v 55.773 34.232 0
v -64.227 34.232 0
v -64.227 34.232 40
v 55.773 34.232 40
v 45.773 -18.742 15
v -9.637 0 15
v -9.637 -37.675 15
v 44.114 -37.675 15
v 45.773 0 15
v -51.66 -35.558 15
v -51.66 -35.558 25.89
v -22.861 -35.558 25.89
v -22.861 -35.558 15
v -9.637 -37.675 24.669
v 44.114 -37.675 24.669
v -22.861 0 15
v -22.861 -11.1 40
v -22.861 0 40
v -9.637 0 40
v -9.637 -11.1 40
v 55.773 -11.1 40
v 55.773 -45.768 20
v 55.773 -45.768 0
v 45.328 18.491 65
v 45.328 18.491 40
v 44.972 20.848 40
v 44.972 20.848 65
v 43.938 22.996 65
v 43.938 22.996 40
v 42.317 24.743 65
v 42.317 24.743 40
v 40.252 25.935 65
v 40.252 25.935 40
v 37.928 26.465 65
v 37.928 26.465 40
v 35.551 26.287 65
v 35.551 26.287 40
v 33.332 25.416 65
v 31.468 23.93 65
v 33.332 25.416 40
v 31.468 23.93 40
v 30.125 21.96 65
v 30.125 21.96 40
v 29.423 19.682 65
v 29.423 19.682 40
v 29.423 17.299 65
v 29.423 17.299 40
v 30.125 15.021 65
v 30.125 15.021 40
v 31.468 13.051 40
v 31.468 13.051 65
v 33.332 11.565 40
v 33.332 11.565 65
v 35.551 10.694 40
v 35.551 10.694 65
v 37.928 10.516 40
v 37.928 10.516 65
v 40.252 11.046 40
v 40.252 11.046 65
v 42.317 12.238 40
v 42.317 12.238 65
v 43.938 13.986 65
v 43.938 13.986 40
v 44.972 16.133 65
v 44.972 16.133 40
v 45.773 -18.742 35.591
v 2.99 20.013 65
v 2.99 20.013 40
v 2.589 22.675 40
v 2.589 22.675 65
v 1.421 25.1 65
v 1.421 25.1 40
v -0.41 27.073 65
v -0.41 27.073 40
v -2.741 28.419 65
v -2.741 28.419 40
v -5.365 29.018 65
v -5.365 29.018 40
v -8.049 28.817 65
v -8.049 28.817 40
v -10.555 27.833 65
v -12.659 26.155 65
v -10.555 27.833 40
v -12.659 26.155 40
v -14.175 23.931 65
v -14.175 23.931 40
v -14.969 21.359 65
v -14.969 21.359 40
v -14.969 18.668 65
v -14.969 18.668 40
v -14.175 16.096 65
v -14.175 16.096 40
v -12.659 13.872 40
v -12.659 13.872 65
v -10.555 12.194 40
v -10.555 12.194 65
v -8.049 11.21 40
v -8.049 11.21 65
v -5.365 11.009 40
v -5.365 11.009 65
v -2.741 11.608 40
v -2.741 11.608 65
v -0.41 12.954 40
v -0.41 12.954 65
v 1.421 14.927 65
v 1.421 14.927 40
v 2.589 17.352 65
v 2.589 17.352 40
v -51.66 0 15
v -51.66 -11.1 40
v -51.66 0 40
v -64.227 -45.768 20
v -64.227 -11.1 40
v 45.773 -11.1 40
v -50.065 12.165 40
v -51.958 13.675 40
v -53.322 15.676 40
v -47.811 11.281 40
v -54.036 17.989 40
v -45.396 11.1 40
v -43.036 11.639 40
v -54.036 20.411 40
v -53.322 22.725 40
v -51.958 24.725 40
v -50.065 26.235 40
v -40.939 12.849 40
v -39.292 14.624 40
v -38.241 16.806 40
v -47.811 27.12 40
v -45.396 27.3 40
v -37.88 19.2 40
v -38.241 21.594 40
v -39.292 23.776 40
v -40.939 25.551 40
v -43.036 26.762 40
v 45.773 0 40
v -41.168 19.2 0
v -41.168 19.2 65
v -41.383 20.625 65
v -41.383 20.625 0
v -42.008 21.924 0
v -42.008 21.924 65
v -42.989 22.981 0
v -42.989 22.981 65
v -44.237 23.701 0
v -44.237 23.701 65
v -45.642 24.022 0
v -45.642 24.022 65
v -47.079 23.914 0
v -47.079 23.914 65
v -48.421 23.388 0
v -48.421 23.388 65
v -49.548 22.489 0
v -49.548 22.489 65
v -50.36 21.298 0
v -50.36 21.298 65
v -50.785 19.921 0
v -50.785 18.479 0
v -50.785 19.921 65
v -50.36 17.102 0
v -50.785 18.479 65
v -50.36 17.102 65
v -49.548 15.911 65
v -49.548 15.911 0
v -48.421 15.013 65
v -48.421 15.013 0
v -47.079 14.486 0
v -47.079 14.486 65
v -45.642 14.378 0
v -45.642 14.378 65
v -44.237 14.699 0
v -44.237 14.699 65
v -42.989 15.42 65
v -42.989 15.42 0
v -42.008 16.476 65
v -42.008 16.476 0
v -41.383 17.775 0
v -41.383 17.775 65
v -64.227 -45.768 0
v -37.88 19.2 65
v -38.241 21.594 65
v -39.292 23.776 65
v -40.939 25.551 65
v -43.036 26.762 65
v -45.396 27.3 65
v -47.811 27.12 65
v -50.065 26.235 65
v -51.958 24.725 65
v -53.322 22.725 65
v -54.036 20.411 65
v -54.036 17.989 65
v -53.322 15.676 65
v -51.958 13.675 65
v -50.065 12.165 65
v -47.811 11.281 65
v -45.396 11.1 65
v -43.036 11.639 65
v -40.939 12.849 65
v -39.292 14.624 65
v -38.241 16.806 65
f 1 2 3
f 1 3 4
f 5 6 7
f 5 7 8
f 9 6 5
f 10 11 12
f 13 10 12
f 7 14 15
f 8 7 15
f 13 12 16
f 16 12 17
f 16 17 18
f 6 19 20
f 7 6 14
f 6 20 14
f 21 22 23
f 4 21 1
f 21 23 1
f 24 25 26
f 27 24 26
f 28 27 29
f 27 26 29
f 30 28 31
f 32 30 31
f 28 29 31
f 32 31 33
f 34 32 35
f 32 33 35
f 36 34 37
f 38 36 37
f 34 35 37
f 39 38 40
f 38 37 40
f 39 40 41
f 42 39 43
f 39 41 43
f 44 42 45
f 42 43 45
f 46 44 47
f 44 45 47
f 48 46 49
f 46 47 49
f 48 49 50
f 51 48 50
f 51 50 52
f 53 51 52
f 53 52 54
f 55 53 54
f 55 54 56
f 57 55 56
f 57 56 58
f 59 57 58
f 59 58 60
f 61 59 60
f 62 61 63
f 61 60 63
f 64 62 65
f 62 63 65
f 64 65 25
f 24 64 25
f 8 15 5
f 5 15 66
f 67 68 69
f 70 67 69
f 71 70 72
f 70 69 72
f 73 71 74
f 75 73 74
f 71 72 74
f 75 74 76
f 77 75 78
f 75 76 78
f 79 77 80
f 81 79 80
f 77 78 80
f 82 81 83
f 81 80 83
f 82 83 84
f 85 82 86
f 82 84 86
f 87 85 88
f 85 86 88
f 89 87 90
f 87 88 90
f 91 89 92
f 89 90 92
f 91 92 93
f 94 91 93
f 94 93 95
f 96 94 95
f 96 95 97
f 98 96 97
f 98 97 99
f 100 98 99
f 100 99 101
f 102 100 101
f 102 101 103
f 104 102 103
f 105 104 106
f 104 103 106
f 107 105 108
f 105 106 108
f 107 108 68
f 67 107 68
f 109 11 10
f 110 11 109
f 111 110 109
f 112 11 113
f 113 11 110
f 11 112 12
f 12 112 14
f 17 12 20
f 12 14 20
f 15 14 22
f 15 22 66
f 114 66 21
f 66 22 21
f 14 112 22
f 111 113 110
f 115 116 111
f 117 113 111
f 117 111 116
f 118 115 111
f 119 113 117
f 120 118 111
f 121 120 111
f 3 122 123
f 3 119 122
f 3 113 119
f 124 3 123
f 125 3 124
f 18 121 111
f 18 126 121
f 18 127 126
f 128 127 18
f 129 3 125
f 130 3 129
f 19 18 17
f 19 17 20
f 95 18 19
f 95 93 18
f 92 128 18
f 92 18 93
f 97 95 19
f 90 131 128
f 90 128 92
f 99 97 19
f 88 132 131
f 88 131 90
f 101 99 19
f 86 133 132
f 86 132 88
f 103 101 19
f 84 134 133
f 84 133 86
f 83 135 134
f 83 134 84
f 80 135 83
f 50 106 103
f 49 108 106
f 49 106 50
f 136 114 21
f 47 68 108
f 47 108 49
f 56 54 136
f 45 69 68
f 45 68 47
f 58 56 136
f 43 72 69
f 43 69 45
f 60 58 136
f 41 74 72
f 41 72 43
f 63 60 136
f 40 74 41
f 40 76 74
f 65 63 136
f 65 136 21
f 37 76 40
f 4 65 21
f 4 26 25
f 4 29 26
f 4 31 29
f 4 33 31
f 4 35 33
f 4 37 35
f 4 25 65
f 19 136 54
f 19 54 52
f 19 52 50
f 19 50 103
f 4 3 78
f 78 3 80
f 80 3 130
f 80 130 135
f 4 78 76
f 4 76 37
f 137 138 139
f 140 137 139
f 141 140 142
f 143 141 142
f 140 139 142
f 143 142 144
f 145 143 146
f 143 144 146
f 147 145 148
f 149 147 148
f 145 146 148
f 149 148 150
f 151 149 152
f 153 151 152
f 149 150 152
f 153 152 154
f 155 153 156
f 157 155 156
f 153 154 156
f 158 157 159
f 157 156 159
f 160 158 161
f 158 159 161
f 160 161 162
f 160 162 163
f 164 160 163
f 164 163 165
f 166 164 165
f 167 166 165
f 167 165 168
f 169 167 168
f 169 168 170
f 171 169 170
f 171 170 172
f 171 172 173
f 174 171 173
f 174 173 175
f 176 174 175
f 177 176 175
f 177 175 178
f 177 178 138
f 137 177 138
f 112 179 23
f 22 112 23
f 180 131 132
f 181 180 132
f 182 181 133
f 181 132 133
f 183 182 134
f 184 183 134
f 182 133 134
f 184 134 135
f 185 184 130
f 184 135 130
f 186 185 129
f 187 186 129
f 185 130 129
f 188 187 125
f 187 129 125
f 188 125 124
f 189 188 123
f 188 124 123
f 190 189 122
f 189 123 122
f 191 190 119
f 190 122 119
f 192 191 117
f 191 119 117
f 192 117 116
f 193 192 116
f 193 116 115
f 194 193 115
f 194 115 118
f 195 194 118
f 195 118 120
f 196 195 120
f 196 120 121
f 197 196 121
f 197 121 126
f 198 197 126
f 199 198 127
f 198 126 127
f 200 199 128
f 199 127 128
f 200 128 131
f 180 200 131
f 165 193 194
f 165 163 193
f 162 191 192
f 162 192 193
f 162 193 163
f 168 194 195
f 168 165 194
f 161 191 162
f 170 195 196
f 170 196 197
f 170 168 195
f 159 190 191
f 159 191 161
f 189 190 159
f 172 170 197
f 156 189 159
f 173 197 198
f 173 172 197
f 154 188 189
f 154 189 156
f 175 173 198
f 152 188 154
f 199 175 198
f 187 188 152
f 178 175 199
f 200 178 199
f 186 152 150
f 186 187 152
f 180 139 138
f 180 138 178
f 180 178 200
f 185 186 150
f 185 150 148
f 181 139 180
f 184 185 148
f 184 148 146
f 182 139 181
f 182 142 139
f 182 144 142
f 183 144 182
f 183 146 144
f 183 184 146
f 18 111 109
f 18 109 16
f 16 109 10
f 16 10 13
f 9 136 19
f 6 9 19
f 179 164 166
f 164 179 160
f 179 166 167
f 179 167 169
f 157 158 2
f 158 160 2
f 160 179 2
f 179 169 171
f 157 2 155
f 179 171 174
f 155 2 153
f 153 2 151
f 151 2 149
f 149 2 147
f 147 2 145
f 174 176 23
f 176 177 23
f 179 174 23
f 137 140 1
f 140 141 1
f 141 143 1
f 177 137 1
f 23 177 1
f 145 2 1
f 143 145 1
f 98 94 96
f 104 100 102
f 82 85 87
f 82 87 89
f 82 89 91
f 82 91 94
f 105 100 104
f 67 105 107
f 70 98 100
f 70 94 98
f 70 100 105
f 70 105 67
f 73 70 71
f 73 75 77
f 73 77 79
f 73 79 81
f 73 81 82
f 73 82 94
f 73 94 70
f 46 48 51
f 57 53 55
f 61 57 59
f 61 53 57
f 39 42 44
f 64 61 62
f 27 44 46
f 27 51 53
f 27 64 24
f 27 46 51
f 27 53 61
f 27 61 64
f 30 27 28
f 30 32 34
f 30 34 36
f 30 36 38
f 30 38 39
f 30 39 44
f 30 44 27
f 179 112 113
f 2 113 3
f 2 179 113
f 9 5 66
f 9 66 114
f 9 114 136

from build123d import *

# Parameters (mm, degrees)
F0_W     = 120
F0_H     = 80
F1_DEPTH = 40
F2_W     = 28.798189
F2_H     = 35.557579
F3_DEPTH = 25
F5_DEPTH = 120.001
F6_R     = 8.123016
F6_R_2   = 9.029606
F6_R_3   = 7.997109
F7_DEPTH = 25
F8_R     = 4.835396
F9_DEPTH = 65.001


with BuildPart() as f1:
    # F0 (on Top) → F1 (new body)
    with BuildSketch(Plane.XY):
        with Locations((-4.226902, -5.768067)):
            Rectangle(F0_W, F0_H)
    extrude(amount=F1_DEPTH)

    # F2 (on face) → F3 (cut)
    with BuildSketch(Plane.XY.offset(40)):
        with Locations((-37.26047, -17.778789)):
            Rectangle(F2_W, F2_H)
        Polygon((45.773098, 0), (-9.63674, 0), (-9.63674, -37.675409), (44.113688, -37.675409), (45.773098, -18.742215), align=None)
    extrude(amount=-F3_DEPTH, mode=Mode.SUBTRACT)

    # F4 (on face) → F5 (cut, through all)
    with BuildSketch(Plane.YZ.offset(55.773098)):
        Polygon((-45.768067, 40), (-45.768067, 20), (-11.09978, 40), align=None)
    extrude(amount=-F5_DEPTH, mode=Mode.SUBTRACT)

    # F6 (on face) → F7 (join)
    with BuildSketch(Plane.XY.offset(40)):
        with Locations((-46.003349, 19.200161)):
            Circle(F6_R)
        with Locations((-6.039798, 20.013448)):
            Circle(F6_R_2)
        with Locations((37.330549, 18.490579)):
            Circle(F6_R_3)
    extrude(amount=F7_DEPTH)

    # F8 (on face) → F9 (cut, through all)
    with BuildSketch(Plane.XY.offset(65)):
        with Locations((-46.003349, 19.200161)):
            Circle(F8_R)
    extrude(amount=-F9_DEPTH, mode=Mode.SUBTRACT)


solid = f1.part
